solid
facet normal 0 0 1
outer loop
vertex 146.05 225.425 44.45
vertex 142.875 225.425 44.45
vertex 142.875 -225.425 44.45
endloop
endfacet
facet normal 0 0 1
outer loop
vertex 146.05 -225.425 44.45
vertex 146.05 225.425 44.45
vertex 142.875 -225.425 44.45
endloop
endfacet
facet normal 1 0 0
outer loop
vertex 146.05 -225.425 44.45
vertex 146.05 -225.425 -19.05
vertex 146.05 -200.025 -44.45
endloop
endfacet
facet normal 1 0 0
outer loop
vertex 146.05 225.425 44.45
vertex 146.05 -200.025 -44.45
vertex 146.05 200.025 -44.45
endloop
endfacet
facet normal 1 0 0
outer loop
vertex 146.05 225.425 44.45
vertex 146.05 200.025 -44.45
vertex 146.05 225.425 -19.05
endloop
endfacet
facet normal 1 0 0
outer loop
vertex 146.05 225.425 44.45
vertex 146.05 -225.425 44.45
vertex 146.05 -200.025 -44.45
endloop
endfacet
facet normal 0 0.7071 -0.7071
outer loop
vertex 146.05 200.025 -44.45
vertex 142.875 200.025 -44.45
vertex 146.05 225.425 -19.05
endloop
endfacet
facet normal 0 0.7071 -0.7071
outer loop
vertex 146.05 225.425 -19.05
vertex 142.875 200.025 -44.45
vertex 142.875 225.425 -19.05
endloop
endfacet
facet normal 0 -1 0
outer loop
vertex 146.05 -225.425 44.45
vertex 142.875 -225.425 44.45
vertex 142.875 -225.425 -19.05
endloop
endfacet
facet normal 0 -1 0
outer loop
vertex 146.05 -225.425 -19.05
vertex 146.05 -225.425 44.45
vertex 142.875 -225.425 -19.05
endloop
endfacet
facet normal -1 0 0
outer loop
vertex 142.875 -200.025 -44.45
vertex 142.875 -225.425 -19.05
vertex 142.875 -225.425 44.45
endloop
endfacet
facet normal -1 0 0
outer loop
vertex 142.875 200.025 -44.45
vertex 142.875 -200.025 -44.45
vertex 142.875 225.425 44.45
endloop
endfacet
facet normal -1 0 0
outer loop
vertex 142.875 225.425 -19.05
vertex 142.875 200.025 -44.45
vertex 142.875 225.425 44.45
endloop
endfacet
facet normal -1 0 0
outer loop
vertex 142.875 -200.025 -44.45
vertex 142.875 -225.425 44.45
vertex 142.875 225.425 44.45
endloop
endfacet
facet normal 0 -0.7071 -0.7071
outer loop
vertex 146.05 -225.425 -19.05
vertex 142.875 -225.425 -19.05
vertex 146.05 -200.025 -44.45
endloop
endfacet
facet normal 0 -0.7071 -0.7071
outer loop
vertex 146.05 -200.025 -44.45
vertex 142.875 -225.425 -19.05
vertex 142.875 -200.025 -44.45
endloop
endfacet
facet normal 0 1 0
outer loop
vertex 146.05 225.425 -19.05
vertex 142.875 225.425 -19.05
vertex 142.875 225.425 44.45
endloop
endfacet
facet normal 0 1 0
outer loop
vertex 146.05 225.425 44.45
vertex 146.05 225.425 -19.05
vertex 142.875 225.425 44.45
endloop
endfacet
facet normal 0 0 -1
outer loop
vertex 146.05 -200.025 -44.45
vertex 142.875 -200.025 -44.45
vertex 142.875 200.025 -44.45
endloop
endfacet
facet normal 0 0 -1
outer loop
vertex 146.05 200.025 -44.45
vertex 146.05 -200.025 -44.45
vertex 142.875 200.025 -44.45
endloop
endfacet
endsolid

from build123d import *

# Parameters (mm, degrees)
F2_DEPTH = 3.175


with BuildPart() as f2:
    # F1 (on offset) → F2 (new body)
    with BuildSketch(Plane.YZ.offset(142.875)):
        Polygon((225.425, -19.05), (225.425, 44.45), (-225.425, 44.45), (-225.425, -19.05), (-200.025, -44.45), (200.025, -44.45), align=None)
    extrude(amount=F2_DEPTH)


solid = f2.part
